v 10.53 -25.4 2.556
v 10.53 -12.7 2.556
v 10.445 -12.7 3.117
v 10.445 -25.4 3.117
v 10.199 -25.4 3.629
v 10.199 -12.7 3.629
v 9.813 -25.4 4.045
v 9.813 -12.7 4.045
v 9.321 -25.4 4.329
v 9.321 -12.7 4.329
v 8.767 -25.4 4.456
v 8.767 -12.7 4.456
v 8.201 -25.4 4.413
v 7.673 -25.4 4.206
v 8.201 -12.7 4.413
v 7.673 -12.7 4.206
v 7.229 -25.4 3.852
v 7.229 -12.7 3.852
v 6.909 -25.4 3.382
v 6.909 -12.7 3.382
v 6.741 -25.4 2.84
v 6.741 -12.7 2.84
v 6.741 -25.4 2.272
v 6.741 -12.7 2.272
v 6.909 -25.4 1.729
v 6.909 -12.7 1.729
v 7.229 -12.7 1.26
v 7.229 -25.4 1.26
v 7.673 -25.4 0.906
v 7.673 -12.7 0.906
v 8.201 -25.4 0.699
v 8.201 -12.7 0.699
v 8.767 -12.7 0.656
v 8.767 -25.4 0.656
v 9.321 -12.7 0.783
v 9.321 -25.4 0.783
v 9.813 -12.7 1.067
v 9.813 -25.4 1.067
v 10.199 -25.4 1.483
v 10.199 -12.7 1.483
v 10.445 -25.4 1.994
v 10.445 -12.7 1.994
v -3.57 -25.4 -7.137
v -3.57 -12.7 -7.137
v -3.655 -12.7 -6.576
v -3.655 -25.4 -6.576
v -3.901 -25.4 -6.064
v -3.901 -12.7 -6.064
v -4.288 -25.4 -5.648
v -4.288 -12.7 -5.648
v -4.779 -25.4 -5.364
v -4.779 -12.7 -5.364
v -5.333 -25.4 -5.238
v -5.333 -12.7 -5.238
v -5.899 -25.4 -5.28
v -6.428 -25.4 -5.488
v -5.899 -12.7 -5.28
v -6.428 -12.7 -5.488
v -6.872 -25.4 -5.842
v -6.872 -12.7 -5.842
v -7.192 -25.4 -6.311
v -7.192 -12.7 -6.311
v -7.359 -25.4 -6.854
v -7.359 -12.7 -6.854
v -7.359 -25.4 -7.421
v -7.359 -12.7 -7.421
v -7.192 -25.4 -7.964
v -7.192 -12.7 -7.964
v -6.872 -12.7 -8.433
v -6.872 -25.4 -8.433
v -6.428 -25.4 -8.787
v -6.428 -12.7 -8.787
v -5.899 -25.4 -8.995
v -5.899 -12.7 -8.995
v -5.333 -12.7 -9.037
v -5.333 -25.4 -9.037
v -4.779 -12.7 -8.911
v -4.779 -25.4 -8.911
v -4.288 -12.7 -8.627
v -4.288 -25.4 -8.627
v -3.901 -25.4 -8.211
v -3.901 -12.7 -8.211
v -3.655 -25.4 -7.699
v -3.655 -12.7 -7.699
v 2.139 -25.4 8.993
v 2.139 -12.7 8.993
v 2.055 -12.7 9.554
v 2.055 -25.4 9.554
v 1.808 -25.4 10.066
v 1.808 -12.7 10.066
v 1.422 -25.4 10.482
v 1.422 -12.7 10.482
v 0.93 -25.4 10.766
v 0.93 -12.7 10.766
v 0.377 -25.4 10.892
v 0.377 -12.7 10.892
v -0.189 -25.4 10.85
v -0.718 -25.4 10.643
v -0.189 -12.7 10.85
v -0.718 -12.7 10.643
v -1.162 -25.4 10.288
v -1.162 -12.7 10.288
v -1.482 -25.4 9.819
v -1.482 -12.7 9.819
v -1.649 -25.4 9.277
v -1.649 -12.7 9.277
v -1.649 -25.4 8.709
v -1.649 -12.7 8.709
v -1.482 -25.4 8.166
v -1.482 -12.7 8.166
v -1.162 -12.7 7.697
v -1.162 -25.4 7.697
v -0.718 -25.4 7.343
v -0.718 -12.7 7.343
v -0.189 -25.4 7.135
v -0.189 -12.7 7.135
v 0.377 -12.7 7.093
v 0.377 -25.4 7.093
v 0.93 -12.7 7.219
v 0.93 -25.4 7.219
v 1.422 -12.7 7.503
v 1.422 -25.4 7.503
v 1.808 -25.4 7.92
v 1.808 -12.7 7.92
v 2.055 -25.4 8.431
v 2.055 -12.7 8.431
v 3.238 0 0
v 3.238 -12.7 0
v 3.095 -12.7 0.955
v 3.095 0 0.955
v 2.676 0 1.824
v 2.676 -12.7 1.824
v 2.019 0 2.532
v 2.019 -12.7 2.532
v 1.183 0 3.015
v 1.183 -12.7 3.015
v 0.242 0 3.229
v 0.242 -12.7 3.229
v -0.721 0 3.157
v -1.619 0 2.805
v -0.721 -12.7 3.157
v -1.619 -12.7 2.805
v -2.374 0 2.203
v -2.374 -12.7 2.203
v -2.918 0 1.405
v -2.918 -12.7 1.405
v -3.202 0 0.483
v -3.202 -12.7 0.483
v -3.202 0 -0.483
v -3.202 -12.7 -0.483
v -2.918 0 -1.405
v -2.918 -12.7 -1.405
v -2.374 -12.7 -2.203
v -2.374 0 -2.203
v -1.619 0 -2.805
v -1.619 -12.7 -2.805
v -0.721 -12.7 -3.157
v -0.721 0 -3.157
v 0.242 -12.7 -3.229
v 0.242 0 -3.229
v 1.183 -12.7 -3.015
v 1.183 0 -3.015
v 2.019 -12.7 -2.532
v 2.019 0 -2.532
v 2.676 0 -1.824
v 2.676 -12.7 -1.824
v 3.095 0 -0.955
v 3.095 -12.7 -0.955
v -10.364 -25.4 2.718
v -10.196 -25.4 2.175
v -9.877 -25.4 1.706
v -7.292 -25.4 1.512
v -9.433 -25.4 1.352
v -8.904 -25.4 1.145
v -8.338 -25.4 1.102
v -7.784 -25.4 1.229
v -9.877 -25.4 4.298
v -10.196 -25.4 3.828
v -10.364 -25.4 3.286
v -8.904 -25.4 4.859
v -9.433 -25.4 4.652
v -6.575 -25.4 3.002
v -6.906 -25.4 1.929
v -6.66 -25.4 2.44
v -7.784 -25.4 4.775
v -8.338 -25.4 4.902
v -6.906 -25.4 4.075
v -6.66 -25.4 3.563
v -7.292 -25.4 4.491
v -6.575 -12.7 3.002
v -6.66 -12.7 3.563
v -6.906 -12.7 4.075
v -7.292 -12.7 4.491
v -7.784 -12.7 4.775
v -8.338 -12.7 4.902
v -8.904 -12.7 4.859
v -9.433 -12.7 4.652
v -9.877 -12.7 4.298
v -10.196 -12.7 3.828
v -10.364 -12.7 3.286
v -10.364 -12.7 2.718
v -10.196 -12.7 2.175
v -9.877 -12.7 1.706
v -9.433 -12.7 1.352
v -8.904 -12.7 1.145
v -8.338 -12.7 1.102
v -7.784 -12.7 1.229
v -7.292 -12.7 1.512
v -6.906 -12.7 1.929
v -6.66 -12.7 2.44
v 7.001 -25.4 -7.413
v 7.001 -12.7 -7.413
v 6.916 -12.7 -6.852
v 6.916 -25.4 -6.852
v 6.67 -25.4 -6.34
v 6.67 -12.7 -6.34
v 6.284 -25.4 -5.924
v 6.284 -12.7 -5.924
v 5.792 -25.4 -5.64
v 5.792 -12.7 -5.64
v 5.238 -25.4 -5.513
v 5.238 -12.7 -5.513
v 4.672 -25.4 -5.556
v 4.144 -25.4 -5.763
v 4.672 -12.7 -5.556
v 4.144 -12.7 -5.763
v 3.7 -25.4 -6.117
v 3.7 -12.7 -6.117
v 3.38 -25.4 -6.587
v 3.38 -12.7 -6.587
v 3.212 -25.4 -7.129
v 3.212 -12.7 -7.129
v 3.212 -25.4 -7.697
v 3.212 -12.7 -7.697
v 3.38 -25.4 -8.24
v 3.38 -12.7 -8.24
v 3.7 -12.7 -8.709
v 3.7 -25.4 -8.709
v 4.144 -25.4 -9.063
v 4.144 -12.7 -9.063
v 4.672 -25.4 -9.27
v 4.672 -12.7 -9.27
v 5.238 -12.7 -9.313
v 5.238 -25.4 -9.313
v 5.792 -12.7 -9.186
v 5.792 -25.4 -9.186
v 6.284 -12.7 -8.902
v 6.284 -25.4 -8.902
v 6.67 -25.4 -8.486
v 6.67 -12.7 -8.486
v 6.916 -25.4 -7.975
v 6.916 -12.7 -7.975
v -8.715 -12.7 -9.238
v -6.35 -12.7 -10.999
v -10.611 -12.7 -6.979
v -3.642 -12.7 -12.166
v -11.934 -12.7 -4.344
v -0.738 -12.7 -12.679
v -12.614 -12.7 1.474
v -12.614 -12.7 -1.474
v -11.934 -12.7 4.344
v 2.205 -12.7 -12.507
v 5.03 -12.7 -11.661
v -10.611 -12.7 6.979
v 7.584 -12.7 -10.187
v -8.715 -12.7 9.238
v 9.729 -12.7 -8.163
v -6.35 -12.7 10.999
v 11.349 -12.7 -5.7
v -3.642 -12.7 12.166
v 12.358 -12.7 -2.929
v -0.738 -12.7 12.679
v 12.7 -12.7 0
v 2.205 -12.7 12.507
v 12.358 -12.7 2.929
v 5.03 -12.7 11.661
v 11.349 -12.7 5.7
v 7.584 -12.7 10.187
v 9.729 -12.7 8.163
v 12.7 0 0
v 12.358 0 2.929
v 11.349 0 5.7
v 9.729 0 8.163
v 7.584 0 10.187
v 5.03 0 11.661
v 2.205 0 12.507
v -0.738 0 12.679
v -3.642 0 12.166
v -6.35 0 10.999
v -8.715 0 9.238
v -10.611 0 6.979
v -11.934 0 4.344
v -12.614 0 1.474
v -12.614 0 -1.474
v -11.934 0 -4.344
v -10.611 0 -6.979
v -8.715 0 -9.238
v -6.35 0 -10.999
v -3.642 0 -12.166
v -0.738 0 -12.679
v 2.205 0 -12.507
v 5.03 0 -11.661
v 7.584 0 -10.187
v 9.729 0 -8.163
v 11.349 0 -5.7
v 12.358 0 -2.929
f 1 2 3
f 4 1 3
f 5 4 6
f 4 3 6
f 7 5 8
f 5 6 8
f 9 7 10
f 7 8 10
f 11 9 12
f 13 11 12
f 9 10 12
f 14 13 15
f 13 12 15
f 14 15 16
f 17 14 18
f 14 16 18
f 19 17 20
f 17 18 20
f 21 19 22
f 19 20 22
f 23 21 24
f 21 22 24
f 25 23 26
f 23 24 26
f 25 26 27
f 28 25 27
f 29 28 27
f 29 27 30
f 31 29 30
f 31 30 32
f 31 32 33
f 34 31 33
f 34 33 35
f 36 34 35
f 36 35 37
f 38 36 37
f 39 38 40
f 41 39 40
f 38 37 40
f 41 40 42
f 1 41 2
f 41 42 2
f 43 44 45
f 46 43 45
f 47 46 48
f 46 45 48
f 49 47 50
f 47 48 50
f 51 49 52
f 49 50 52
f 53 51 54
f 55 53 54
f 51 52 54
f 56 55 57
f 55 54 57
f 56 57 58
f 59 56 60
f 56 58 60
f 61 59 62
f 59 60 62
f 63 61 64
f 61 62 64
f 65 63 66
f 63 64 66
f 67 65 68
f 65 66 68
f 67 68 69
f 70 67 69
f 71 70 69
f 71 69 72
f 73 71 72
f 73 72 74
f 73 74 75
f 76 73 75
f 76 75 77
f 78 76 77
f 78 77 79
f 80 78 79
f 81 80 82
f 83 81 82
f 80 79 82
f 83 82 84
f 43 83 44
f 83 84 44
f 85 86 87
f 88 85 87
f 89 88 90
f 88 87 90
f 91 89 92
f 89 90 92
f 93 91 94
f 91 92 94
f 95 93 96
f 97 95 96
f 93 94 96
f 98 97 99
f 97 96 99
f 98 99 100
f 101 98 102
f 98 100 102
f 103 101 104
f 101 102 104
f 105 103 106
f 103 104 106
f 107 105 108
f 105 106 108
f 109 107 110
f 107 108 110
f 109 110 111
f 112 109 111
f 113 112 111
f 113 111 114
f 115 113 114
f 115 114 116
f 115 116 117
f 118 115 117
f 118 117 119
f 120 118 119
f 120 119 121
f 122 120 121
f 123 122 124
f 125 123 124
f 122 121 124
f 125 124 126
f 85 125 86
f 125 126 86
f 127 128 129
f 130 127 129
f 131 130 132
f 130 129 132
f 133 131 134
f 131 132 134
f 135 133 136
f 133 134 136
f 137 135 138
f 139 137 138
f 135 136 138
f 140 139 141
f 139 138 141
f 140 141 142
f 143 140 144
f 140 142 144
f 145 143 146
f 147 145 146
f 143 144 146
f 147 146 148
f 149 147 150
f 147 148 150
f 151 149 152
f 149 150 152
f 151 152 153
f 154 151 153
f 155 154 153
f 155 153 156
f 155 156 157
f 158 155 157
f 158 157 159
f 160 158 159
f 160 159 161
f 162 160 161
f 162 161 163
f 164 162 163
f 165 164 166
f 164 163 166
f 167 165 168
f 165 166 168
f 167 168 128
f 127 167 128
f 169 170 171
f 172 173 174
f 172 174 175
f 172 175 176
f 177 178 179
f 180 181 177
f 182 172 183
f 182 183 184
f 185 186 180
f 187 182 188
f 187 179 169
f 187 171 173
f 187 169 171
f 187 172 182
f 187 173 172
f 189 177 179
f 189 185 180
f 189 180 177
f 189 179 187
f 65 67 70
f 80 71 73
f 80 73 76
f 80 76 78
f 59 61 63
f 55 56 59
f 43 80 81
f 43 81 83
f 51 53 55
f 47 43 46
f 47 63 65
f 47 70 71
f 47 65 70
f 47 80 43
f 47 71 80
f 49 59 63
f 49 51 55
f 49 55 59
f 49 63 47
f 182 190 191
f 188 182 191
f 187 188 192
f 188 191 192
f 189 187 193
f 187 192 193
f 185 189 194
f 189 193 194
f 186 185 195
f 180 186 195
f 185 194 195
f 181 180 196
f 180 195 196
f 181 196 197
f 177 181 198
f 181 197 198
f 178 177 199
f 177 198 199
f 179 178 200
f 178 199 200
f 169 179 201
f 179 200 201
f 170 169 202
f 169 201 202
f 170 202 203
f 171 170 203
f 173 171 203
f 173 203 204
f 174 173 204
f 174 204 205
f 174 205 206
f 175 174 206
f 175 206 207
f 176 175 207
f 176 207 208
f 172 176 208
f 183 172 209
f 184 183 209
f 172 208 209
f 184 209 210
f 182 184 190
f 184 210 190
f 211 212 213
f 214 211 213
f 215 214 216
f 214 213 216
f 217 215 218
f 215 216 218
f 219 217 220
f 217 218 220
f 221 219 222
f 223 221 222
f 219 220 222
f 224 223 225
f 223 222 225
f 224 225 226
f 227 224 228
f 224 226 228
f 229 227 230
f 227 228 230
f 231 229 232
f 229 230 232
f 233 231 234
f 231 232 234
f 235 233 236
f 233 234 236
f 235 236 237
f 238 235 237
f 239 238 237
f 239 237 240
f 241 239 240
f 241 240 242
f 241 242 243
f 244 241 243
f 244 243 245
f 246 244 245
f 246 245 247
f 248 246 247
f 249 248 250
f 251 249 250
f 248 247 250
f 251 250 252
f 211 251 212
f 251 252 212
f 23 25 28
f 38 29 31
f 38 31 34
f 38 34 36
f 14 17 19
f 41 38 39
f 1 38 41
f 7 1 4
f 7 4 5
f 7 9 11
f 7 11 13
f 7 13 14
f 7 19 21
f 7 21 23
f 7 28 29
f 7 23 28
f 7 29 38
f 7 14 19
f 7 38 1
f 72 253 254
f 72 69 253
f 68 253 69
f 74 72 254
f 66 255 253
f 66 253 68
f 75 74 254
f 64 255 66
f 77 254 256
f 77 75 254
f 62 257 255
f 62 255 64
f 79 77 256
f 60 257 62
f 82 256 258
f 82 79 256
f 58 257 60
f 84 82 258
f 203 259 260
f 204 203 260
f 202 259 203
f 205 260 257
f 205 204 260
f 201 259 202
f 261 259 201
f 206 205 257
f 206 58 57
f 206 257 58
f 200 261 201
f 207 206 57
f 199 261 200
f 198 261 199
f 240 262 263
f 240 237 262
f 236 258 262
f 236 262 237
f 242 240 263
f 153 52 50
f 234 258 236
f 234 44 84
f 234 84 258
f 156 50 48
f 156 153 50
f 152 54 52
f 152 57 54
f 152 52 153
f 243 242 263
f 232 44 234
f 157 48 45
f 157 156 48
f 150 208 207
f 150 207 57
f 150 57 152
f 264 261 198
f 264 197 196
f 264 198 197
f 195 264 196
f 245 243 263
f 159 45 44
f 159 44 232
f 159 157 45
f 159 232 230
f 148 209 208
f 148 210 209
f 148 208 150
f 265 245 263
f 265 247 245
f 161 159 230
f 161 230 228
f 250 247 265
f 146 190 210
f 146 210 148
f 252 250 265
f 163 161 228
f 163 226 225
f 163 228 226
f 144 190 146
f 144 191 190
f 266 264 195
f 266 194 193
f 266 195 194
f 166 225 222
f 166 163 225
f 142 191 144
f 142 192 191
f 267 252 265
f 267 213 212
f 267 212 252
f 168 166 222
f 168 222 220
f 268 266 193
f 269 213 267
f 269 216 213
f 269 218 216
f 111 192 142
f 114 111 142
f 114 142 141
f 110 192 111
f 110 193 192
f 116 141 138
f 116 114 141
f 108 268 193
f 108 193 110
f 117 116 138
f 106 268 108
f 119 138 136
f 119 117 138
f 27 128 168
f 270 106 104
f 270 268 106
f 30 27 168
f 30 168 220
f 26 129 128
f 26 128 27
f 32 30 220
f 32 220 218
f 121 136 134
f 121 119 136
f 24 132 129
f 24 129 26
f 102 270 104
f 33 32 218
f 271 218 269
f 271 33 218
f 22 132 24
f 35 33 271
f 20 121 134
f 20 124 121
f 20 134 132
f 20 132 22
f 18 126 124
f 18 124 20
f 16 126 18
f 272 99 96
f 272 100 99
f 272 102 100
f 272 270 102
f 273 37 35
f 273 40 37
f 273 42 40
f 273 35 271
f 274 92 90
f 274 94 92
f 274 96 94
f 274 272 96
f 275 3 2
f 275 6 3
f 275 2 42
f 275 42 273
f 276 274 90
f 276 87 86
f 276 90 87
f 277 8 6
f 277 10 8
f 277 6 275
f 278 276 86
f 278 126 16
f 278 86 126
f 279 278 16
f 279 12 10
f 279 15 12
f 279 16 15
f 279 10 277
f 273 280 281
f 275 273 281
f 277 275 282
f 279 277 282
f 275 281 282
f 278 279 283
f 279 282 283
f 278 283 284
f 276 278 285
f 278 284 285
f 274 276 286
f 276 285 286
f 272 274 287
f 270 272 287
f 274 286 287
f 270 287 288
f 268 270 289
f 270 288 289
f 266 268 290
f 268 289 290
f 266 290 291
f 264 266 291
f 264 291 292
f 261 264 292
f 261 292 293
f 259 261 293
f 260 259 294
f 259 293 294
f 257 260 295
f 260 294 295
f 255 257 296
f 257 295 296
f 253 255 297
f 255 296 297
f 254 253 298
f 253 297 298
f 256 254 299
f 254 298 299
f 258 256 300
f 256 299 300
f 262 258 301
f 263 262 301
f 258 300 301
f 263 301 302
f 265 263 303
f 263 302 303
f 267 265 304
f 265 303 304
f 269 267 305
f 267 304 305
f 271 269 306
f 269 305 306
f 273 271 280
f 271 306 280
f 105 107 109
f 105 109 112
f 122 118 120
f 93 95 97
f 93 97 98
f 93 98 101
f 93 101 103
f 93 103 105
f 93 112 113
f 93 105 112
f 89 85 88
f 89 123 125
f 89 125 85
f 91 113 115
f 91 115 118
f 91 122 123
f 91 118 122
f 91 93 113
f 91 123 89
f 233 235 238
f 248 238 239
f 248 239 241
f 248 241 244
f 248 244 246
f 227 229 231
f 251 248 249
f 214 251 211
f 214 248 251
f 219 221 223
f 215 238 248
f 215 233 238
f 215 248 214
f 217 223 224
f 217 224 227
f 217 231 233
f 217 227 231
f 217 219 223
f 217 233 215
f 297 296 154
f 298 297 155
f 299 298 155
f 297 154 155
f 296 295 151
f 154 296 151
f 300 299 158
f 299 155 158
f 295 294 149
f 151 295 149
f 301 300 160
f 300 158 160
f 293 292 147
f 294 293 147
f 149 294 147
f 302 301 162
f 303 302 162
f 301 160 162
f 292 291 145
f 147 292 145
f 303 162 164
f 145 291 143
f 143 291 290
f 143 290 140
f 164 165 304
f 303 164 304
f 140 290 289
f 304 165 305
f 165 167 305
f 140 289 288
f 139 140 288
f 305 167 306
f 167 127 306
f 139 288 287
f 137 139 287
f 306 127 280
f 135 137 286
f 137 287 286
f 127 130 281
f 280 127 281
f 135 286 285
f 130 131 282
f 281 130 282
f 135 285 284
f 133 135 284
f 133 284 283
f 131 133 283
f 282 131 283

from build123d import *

# Parameters (mm, degrees)
F0_R     = 12.7
F1_DEPTH = 12.7
F2_R     = 3.2385
F3_DEPTH = 12.7
F4_R     = 1.905
F5_DEPTH = 12.7


with BuildPart() as f1:
    # F0 (on Front) → F1 (new body)
    with BuildSketch(Plane.XZ):
        Circle(F0_R)
    extrude(amount=F1_DEPTH)

    # F2 (on face) → F3 (cut)
    with BuildSketch(Plane.XZ.offset(12.7)):
        Circle(F2_R)
    extrude(amount=-F3_DEPTH, mode=Mode.SUBTRACT)

    # F4 (on face) → F5 (join)
    with BuildSketch(Plane.XZ.offset(12.7)):
        with Locations((-8.480146, 3.001869)):
            Circle(F4_R)
        with Locations((-5.475456, -7.13747)):
            Circle(F4_R)
        with Locations((5.096128, -7.413068)):
            Circle(F4_R)
        with Locations((8.625037, 2.555942)):
            Circle(F4_R)
        with Locations((0.234438, 8.992727)):
            Circle(F4_R)
    extrude(amount=F5_DEPTH)


solid = f1.part
